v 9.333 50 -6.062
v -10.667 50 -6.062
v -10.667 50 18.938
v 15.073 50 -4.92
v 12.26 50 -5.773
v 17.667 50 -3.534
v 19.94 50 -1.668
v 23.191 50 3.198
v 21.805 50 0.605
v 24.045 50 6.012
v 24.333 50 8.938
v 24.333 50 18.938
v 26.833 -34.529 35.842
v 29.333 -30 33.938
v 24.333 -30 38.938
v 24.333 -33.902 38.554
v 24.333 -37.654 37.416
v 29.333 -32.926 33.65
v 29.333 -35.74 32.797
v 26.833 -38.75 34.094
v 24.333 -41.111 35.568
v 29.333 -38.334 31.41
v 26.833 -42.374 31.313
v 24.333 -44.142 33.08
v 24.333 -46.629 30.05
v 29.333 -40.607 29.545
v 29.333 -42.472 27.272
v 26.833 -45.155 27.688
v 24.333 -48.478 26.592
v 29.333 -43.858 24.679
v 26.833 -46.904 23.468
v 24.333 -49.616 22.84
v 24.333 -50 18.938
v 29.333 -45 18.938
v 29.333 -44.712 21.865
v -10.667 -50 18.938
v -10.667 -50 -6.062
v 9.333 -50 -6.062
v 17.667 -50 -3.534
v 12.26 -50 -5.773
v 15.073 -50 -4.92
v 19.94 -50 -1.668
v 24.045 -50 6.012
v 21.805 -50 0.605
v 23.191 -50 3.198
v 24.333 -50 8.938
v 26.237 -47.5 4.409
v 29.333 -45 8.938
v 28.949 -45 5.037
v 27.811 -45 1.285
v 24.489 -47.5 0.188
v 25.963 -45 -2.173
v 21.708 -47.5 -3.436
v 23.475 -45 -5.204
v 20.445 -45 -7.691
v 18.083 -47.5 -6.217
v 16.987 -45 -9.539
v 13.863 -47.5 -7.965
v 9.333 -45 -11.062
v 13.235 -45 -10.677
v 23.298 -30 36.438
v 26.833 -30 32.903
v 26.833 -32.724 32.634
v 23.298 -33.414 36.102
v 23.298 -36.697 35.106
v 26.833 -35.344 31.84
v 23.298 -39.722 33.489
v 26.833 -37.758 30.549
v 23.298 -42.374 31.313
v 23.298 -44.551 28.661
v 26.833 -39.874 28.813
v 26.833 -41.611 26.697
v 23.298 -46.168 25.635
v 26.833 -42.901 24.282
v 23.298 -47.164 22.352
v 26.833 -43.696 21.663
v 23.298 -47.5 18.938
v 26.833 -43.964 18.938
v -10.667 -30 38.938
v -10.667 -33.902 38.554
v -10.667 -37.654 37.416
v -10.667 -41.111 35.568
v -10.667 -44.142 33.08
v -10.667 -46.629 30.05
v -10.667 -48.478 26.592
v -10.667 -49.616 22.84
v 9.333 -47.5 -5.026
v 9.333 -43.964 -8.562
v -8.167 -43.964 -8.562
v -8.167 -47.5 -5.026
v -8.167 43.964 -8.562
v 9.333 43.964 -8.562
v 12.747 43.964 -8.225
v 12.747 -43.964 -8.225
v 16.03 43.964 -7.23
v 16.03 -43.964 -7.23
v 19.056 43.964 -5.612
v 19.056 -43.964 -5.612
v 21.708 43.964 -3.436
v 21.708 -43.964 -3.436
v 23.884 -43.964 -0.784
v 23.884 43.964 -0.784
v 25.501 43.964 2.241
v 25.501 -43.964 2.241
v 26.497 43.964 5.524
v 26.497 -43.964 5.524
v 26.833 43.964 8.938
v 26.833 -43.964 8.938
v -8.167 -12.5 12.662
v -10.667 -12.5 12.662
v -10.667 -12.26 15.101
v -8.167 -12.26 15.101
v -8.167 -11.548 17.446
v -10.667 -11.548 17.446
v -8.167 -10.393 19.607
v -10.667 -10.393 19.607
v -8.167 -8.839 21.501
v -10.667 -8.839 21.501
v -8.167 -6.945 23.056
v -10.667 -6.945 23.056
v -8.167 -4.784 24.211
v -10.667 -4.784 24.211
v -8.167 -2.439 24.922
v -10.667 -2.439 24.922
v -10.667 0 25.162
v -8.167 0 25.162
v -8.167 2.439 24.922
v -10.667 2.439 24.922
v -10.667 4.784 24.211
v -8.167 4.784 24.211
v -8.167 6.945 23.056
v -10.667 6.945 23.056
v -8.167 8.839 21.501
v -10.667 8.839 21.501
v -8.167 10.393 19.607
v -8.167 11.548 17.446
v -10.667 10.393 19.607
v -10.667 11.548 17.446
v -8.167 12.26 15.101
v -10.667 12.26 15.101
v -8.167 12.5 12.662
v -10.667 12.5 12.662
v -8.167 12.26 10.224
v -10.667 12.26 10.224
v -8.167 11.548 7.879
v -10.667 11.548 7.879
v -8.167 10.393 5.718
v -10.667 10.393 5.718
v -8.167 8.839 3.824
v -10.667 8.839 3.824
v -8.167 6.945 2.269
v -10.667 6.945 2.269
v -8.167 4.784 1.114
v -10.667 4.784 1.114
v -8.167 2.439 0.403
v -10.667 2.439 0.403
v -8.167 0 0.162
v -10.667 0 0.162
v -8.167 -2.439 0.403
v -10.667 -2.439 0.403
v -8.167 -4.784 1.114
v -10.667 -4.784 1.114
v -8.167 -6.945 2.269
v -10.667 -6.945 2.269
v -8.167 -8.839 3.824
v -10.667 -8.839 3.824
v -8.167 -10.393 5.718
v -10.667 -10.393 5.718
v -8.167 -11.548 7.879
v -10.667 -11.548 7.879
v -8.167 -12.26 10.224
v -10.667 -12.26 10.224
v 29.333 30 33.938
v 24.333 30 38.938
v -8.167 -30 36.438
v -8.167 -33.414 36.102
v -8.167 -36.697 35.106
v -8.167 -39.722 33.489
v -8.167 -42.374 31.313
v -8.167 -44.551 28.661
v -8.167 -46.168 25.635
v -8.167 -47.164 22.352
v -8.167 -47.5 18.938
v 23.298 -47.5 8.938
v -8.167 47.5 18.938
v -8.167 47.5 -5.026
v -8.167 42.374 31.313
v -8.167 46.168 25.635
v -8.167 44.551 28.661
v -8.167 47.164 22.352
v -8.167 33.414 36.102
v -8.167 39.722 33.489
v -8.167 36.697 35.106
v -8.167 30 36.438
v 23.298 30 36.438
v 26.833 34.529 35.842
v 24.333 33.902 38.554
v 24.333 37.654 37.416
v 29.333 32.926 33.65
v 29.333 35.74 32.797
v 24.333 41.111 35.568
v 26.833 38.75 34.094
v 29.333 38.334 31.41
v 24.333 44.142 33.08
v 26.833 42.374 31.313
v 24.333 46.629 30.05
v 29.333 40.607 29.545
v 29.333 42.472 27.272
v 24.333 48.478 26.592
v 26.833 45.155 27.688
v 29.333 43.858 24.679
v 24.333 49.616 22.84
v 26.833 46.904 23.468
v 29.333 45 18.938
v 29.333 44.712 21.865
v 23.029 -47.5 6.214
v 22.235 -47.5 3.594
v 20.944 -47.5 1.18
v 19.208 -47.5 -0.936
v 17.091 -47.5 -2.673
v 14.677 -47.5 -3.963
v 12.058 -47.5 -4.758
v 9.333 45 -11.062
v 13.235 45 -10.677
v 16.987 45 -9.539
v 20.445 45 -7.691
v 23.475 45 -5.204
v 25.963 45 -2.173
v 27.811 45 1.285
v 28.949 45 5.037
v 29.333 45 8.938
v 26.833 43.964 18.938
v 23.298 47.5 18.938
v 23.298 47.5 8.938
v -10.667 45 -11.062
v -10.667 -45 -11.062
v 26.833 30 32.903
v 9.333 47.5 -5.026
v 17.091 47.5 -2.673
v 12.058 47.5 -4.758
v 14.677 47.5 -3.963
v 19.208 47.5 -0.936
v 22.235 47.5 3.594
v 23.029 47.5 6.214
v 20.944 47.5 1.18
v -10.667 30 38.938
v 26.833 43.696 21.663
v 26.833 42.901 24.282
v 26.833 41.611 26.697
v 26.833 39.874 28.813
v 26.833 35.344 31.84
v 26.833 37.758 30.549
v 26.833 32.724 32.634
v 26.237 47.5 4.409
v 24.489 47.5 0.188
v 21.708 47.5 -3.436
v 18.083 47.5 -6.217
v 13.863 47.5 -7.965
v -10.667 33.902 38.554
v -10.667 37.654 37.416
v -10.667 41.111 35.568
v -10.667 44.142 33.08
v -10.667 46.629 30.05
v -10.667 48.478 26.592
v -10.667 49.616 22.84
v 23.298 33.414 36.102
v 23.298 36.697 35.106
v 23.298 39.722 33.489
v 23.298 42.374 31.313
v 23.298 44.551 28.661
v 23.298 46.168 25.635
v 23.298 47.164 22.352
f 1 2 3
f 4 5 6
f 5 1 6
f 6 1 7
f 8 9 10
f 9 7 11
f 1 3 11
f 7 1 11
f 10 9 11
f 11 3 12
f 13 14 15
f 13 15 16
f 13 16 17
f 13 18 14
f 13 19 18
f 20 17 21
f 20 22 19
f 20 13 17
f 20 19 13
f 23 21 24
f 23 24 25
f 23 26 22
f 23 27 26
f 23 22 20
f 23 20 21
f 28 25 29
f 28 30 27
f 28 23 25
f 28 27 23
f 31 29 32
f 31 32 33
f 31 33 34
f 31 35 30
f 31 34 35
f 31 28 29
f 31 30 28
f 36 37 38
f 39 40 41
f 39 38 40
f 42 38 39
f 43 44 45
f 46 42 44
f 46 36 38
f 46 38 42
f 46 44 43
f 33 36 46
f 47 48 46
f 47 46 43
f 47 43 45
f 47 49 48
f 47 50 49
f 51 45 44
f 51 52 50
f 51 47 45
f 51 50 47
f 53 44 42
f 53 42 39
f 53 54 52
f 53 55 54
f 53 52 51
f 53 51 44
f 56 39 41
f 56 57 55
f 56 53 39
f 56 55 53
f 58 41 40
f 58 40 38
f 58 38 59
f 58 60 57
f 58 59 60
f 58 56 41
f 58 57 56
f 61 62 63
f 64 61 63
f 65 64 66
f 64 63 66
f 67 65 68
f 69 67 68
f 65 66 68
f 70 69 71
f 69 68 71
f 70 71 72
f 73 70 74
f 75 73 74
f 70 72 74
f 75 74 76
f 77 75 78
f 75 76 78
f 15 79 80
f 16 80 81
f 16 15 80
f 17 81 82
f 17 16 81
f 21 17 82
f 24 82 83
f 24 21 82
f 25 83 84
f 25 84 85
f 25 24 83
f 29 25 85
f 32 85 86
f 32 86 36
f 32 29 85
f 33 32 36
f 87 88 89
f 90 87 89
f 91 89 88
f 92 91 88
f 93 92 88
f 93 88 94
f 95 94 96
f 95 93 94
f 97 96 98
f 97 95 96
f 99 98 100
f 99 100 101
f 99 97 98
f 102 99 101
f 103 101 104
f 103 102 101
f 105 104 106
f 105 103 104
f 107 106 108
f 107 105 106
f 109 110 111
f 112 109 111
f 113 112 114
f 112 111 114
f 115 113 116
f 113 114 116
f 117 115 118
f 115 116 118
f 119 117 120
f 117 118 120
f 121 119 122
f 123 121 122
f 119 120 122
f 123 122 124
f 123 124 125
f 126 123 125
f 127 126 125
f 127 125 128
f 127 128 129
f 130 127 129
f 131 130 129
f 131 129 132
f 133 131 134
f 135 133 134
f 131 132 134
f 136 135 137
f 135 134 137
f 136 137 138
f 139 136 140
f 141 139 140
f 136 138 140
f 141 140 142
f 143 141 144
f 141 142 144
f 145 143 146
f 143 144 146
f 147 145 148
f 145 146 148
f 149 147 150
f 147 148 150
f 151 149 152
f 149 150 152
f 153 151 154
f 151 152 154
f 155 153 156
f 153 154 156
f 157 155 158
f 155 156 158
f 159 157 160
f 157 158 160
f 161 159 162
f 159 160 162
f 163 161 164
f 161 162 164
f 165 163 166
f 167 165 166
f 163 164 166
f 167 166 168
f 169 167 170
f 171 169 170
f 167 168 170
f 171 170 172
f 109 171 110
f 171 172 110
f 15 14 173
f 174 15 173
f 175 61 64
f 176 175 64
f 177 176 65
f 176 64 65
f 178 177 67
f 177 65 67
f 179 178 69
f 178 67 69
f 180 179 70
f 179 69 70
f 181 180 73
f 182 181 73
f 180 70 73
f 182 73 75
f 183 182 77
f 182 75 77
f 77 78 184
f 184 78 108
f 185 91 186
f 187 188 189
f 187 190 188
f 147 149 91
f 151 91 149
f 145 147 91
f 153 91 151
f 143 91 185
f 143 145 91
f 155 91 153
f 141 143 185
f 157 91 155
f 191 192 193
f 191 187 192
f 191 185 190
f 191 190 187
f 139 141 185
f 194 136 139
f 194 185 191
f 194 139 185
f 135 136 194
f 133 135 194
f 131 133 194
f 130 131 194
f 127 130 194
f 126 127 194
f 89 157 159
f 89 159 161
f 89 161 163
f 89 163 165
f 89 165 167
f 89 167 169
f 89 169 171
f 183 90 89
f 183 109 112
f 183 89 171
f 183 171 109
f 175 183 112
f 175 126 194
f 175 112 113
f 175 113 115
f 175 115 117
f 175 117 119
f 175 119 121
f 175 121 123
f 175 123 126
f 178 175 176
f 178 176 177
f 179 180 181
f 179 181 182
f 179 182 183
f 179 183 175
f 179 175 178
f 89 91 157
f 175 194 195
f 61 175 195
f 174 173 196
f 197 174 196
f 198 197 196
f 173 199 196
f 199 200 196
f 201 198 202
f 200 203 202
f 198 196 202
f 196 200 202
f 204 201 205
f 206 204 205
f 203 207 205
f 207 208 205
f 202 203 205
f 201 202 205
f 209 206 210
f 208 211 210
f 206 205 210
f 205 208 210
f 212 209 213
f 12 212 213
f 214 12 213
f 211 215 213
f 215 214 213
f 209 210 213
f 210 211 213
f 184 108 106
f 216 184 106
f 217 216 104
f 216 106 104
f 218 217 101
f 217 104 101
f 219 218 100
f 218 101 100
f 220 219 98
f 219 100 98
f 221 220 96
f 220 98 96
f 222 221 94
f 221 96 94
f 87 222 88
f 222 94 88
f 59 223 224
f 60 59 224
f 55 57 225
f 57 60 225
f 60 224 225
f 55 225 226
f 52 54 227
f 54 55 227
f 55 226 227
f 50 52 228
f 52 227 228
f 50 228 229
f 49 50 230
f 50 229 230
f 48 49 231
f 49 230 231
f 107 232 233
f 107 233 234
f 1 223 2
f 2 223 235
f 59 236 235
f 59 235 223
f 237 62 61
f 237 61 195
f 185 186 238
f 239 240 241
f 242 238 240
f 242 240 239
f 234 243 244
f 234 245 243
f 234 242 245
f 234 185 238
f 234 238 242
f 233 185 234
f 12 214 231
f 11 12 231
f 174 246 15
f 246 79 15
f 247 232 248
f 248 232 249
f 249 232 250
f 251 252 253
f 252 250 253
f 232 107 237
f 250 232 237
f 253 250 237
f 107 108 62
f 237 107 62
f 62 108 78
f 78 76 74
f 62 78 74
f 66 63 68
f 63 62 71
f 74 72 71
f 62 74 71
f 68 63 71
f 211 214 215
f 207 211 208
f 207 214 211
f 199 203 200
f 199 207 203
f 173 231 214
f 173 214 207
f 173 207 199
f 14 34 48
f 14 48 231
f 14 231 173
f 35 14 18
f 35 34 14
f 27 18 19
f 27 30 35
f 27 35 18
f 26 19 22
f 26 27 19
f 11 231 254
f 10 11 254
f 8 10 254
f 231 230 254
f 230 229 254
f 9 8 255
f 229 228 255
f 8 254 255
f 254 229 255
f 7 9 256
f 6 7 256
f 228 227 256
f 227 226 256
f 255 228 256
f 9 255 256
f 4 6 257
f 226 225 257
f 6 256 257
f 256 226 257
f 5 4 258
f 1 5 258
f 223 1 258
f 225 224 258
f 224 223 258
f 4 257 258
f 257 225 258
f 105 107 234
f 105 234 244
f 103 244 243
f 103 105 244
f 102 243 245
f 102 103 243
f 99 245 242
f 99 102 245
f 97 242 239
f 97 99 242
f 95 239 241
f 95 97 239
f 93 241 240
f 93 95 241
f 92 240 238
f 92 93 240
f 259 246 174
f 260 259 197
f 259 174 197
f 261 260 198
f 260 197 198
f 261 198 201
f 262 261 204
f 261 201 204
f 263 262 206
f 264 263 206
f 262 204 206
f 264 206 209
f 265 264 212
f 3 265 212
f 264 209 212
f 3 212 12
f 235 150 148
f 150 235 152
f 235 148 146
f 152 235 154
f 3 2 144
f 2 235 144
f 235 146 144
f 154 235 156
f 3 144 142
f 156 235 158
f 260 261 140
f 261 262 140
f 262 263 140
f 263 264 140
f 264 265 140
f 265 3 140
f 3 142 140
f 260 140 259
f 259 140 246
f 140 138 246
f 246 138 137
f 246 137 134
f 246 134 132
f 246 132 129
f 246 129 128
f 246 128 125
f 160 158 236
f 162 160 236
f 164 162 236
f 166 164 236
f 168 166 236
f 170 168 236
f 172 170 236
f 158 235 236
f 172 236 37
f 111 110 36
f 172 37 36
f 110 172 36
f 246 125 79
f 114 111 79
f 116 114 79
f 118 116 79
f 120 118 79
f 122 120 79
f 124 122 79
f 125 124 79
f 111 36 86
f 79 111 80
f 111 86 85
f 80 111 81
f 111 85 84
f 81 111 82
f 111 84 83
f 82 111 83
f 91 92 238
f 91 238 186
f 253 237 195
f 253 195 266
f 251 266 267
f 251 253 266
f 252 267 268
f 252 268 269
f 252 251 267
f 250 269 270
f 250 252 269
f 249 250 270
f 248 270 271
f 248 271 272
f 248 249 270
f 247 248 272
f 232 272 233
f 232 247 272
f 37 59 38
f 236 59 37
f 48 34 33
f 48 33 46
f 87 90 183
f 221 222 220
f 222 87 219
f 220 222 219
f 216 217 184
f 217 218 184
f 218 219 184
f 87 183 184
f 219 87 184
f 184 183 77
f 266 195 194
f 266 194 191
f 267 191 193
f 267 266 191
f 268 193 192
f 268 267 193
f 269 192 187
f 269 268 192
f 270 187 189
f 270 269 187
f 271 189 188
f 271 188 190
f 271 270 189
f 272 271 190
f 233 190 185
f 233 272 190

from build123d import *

# Parameters (mm, degrees)
F0_W     = 40
F0_H     = 50
F1_DEPTH = 50
F2_R     = 20
F3_SIZE  = 5
F4_T     = -2.5
F6_R     = 12.5
F7_DEPTH = 2.5


with BuildPart() as f1:
    # F0 (on Front) → F1 (new body)
    with BuildSketch(Plane.XZ):
        with Locations((9.33321, 13.938332)):
            Rectangle(F0_W, F0_H)
    extrude(amount=F1_DEPTH)

    # F2
    f2_edges = [f1.edges().sort_by_distance(p)[0] for p in [
        (9.33321, -50, 38.938332),
        (29.33321, -25, -11.061668),
    ]]
    fillet(f2_edges, radius=F2_R)

    # F3
    f3_edges = [f1.edges().sort_by_distance(p)[0] for p in [
        (29.33321, -15, 38.938332),
    ]]
    chamfer(f3_edges, length=F3_SIZE)

    # F4
    f4_openings = [f1.faces().sort_by_distance(p)[0] for p in [
        (8.511559, 0, 14.711798),
    ]]
    offset(amount=F4_T, openings=f4_openings)

    # F5: F1 across plane


with BuildPart() as f1_1:
    add(f1.part)
    add(f1.part.mirror(Plane.XZ))

    # F6 (on face) → F7 (cut, through all)
    with BuildSketch(Plane(origin=(-10.66679, 0, 0), x_dir=(0, -1, 0), z_dir=(-1, 0, 0))):
        with Locations((0, 12.662414)):
            Circle(F6_R)
    extrude(amount=-F7_DEPTH, mode=Mode.SUBTRACT)


solid = f1_1.part
